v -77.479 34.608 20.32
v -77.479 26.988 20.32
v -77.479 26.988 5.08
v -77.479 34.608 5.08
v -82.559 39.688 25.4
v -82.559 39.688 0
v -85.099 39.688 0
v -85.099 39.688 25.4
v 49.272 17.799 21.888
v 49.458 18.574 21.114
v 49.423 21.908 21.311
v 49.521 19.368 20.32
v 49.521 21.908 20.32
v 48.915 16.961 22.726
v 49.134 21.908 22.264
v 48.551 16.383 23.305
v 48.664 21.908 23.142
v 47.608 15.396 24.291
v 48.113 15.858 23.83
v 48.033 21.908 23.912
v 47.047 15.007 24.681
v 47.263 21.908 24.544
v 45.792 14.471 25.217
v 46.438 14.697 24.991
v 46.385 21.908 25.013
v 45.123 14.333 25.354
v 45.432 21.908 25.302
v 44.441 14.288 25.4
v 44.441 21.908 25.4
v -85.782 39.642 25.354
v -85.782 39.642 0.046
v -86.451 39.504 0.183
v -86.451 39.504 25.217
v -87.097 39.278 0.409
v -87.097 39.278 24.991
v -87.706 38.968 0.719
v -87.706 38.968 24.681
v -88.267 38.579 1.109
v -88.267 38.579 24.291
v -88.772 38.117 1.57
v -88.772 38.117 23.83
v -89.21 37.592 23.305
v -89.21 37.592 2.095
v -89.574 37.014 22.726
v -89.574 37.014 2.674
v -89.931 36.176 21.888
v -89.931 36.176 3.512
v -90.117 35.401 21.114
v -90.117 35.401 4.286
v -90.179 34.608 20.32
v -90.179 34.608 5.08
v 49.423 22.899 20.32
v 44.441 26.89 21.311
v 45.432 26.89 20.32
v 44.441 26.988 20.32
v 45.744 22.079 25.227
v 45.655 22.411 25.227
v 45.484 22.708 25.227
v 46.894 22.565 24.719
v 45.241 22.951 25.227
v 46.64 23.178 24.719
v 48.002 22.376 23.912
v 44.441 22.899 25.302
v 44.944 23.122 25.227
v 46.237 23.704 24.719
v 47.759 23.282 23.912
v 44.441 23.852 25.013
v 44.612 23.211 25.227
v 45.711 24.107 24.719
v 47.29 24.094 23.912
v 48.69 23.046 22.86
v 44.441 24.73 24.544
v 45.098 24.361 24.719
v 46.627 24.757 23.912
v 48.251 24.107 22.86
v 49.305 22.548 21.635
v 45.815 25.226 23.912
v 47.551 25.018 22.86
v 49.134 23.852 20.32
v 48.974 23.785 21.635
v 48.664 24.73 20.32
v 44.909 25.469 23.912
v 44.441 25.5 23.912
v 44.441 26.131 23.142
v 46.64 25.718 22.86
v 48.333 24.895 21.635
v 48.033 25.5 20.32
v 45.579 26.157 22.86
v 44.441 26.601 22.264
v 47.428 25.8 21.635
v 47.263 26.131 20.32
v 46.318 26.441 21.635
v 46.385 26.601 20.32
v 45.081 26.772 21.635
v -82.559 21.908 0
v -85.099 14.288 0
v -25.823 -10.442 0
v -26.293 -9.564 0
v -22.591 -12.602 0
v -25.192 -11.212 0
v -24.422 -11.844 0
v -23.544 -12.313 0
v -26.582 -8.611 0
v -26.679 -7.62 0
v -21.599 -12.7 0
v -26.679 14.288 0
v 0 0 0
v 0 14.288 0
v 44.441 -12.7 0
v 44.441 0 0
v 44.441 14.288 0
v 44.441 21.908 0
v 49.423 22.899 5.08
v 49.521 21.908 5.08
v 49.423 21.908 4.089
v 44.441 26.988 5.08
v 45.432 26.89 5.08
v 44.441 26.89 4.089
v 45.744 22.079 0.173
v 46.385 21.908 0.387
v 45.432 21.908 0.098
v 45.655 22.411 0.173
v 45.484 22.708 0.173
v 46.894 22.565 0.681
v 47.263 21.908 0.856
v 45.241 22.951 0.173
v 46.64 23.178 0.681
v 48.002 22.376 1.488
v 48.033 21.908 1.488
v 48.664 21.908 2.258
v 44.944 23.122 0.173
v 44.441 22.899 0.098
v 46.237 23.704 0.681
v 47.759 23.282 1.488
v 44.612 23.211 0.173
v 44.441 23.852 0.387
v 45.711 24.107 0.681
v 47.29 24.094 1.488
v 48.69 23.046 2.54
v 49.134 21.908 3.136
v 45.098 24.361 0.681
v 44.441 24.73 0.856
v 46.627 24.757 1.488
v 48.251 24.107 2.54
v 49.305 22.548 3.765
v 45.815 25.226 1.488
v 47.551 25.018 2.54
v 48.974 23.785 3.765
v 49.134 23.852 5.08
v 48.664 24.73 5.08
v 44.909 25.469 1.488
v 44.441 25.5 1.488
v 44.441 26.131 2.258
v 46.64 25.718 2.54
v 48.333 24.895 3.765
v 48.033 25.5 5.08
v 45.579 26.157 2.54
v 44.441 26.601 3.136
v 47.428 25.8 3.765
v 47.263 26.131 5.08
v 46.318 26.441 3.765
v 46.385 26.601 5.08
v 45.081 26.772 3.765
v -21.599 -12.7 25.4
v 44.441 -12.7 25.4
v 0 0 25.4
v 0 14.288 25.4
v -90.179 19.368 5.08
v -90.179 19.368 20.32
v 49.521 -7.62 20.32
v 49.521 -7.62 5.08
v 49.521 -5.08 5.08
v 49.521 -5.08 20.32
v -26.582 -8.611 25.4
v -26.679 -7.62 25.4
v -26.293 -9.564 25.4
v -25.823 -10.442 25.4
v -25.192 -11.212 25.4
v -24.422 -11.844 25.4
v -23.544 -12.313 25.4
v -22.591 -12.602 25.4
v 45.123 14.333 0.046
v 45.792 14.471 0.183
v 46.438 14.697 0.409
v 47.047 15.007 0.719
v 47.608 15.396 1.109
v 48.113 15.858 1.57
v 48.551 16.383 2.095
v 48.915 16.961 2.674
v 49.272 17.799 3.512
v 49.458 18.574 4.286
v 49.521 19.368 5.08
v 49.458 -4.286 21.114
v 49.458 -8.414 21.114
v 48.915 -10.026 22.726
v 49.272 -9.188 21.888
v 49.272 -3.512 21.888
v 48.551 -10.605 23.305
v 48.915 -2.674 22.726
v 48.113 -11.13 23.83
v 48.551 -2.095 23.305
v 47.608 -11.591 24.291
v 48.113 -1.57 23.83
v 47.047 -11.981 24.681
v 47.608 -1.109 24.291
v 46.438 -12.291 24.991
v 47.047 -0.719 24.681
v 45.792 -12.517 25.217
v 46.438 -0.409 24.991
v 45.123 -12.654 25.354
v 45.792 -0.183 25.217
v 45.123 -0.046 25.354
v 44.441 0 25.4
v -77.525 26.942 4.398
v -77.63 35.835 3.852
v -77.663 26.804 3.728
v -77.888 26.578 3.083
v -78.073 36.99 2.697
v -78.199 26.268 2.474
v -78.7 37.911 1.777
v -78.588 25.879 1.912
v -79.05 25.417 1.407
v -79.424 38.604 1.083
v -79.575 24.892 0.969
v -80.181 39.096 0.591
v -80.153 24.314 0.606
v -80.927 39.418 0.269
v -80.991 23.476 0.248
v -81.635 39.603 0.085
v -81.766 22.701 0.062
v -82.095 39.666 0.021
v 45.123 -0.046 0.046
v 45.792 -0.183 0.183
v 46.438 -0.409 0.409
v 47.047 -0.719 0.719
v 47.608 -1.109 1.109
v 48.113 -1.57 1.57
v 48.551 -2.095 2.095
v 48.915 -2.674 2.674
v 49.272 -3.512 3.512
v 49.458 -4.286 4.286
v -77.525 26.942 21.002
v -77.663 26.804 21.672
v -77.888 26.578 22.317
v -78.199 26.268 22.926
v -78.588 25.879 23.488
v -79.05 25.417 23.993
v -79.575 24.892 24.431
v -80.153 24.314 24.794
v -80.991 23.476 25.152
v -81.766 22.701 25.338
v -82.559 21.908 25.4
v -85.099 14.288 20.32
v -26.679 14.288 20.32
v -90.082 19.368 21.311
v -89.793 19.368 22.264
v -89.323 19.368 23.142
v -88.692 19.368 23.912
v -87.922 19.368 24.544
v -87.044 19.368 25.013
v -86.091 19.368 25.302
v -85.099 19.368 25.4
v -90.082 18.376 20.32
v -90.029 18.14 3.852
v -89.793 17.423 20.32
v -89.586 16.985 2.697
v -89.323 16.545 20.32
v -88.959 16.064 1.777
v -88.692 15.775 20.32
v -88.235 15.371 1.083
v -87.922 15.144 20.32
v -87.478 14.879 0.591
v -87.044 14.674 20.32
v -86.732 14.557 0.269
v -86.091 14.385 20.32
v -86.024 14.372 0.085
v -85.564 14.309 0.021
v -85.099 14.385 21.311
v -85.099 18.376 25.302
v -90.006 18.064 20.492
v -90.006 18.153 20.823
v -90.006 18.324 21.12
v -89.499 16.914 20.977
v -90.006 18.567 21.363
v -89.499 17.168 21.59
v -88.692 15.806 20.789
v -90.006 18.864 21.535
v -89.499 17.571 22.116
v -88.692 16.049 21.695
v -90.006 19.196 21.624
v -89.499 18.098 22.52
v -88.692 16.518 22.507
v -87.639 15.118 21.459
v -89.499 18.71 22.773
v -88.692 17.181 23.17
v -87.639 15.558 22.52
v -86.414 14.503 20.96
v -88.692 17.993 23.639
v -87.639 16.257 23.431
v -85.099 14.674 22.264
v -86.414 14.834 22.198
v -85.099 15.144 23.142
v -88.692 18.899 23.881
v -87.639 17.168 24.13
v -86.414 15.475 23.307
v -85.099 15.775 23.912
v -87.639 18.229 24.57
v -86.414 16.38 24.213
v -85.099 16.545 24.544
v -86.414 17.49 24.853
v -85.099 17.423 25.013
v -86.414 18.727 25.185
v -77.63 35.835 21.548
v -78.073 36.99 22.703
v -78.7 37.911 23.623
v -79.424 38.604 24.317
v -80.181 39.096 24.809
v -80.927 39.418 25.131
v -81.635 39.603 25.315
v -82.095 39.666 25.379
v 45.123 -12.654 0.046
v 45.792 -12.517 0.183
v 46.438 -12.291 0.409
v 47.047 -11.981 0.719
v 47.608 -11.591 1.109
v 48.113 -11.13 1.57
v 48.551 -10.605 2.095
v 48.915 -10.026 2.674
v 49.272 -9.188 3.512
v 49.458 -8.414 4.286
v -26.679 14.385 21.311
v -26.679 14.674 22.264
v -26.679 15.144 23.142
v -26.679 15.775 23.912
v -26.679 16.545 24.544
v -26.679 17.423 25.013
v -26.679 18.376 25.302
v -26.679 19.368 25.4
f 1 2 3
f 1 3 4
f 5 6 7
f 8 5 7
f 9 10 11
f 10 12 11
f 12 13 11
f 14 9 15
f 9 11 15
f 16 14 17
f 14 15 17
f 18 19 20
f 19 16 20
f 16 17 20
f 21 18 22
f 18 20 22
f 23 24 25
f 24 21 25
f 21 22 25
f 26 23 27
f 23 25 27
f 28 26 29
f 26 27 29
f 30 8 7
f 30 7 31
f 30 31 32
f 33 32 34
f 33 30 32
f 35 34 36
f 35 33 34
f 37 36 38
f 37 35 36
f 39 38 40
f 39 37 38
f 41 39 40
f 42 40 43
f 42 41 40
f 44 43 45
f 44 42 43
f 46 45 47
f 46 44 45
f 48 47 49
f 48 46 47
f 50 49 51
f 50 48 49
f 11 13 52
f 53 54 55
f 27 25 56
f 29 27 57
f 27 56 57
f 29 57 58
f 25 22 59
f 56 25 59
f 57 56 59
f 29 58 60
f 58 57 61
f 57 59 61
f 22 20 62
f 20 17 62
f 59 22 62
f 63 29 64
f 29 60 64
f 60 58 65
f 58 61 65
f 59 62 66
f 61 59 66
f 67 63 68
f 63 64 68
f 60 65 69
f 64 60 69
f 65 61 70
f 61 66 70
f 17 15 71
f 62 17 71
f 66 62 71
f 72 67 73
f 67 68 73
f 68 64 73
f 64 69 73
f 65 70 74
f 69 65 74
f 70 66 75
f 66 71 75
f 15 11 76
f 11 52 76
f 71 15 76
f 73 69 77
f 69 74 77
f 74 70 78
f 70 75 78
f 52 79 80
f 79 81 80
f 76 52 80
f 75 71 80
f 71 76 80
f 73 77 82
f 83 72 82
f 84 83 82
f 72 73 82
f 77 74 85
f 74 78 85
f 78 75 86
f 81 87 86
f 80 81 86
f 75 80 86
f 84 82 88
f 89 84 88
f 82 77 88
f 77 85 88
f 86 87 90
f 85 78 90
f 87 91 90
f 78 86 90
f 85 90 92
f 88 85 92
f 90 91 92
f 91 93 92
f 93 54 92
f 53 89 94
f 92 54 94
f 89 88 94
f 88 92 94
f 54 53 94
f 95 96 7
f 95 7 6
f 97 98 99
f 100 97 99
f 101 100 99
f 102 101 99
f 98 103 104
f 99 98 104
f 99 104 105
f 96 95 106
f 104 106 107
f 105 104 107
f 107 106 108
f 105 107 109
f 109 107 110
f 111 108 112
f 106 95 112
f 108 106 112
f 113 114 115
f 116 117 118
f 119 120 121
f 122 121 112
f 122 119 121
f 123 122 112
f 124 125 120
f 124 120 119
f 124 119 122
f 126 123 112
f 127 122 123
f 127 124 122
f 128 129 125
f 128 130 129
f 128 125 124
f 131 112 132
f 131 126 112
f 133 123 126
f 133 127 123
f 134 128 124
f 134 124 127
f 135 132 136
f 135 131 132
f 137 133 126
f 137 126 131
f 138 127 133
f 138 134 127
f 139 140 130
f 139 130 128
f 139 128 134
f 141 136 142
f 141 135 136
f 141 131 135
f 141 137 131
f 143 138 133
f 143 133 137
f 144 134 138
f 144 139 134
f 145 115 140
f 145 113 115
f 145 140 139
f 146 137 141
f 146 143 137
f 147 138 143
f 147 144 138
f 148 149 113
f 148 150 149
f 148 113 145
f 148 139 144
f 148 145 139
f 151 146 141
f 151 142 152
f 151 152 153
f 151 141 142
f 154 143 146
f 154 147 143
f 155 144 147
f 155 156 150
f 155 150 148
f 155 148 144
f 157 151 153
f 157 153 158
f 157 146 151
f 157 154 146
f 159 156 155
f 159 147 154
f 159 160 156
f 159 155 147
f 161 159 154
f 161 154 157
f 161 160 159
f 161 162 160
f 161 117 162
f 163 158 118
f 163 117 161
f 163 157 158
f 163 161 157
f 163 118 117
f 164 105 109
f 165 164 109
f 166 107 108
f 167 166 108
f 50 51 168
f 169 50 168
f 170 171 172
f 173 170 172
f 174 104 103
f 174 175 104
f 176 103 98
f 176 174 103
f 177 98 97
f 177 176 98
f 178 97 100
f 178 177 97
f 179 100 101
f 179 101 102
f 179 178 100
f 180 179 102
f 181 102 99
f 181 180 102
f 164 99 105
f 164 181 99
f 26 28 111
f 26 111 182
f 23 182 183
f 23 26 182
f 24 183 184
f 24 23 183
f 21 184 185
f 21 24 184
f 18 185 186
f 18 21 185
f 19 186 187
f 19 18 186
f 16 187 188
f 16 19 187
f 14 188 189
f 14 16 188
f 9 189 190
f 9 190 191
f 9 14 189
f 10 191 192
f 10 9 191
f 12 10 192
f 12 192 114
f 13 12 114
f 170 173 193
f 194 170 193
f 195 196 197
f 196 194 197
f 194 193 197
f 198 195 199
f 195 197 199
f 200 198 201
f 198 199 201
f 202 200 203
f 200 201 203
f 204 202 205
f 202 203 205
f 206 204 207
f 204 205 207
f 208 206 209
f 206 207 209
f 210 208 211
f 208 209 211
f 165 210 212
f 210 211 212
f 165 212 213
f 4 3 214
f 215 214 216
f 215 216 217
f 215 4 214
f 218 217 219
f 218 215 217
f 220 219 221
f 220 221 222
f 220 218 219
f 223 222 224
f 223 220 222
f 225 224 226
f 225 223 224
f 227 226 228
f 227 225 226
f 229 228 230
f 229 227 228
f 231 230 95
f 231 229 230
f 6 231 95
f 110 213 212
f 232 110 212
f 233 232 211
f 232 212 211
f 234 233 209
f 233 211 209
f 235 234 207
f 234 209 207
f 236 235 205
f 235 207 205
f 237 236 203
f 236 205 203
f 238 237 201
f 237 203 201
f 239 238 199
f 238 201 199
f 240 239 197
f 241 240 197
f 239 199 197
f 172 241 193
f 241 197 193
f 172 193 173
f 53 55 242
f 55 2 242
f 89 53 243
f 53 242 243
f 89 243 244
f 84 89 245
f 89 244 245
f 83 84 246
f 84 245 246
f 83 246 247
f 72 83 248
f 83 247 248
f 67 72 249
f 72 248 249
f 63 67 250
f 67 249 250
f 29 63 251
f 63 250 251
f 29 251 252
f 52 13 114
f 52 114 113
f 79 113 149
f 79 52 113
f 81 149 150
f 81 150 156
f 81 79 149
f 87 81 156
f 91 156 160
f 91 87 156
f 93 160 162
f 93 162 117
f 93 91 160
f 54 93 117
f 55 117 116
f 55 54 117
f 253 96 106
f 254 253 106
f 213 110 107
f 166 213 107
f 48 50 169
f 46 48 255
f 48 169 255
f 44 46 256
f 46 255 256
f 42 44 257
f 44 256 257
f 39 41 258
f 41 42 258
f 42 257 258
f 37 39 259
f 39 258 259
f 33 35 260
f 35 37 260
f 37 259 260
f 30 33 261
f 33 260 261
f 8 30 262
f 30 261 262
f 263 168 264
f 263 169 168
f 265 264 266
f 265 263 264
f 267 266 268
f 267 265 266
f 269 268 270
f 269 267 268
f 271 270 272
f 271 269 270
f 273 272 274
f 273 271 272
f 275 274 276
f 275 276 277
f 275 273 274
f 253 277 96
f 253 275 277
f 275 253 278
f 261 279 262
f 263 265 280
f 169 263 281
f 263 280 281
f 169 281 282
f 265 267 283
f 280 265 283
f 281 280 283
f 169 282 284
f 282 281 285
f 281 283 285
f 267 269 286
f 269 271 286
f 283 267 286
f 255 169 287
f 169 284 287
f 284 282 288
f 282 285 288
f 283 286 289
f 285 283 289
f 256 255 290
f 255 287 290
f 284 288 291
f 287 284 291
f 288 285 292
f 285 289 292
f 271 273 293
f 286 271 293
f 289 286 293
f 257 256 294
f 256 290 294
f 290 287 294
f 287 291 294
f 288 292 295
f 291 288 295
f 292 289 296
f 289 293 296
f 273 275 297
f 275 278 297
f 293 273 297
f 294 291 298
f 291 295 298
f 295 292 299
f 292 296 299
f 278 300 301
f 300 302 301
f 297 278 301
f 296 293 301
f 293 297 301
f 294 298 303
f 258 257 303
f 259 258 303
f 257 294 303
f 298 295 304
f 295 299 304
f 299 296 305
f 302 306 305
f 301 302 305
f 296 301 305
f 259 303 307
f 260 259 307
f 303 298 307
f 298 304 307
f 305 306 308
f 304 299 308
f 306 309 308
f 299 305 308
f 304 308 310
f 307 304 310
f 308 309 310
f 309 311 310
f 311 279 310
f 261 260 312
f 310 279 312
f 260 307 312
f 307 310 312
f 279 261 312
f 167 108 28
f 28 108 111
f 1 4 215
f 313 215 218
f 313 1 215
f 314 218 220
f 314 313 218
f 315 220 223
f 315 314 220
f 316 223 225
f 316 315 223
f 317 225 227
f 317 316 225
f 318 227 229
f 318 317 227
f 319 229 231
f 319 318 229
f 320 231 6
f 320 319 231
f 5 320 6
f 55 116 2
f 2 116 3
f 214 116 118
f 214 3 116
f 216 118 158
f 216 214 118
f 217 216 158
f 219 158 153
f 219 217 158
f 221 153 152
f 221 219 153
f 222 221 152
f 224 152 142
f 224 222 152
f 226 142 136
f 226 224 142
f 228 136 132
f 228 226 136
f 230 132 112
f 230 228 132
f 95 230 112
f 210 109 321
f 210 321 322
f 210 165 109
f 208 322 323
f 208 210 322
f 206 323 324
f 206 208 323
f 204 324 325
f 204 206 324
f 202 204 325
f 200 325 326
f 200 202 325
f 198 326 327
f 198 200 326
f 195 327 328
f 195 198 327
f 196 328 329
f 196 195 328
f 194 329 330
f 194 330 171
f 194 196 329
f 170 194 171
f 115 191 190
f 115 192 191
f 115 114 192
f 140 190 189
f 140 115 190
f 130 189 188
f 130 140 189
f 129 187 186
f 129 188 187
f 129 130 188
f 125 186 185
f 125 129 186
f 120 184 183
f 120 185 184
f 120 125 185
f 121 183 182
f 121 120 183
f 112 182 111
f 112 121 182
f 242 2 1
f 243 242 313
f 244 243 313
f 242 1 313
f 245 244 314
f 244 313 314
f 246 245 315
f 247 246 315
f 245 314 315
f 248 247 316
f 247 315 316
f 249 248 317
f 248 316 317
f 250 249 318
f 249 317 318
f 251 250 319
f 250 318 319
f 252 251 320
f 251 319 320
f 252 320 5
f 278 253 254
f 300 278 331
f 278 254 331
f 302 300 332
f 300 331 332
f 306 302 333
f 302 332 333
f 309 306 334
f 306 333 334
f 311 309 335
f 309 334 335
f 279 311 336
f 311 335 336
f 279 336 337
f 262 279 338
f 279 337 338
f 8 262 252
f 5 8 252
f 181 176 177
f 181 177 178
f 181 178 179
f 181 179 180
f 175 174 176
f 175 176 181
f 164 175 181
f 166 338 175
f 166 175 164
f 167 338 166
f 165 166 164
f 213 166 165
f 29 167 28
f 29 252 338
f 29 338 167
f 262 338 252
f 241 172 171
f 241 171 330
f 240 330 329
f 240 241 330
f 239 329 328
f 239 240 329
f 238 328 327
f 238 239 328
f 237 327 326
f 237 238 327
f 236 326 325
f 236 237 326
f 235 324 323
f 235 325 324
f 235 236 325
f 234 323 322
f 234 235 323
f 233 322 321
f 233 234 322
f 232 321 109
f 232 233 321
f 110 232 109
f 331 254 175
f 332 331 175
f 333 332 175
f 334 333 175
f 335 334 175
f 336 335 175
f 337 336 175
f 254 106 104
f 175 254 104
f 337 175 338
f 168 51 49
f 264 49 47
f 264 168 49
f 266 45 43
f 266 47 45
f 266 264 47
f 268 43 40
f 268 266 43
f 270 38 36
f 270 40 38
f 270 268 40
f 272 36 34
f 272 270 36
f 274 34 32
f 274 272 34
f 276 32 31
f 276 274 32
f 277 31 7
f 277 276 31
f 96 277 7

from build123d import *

# Parameters (mm, degrees)
F1_DEPTH = 25.4
F2_R     = 5.08


with BuildPart() as f1:
    # F0 (on Top) → F1 (new body)
    with BuildSketch(Plane.XY):
        Polygon((49.520503, 0), (0, 0), (0, 14.2875), (49.520503, 14.2875), (49.520503, 26.9875), (-77.479497, 26.9875), (-77.479497, 39.6875), (-90.179497, 39.6875), (-90.179497, 14.2875), (-26.679497, 14.2875), (-26.679497, -12.7), (49.520503, -12.7), align=None)
    extrude(amount=F1_DEPTH)

    # F2
    f2_edges = [f1.edges().sort_by_distance(p)[0] for p in [
        (49.520503, 14.2875, 12.7),
        (49.520503, 26.9875, 12.7),
        (49.520503, 20.6375, 0),
        (49.520503, 20.6375, 25.4),
        (49.520503, -12.7, 12.7),
        (49.520503, 0, 12.7),
        (49.520503, -6.35, 0),
        (49.520503, -6.35, 25.4),
        (-13.979497, 26.9875, 25.4),
        (-58.429497, 14.2875, 25.4),
        (-77.479497, 33.3375, 25.4),
        (-77.479497, 33.3375, 0),
        (-13.979497, 26.9875, 0),
        (-77.479497, 39.6875, 12.7),
        (-90.179497, 39.6875, 12.7),
        (-90.179497, 14.2875, 12.7),
        (-90.179497, 26.9875, 0),
        (-90.179497, 26.9875, 25.4),
        (-26.679497, -12.7, 12.7),
    ]]
    fillet(f2_edges, radius=F2_R)


solid = f1.part
